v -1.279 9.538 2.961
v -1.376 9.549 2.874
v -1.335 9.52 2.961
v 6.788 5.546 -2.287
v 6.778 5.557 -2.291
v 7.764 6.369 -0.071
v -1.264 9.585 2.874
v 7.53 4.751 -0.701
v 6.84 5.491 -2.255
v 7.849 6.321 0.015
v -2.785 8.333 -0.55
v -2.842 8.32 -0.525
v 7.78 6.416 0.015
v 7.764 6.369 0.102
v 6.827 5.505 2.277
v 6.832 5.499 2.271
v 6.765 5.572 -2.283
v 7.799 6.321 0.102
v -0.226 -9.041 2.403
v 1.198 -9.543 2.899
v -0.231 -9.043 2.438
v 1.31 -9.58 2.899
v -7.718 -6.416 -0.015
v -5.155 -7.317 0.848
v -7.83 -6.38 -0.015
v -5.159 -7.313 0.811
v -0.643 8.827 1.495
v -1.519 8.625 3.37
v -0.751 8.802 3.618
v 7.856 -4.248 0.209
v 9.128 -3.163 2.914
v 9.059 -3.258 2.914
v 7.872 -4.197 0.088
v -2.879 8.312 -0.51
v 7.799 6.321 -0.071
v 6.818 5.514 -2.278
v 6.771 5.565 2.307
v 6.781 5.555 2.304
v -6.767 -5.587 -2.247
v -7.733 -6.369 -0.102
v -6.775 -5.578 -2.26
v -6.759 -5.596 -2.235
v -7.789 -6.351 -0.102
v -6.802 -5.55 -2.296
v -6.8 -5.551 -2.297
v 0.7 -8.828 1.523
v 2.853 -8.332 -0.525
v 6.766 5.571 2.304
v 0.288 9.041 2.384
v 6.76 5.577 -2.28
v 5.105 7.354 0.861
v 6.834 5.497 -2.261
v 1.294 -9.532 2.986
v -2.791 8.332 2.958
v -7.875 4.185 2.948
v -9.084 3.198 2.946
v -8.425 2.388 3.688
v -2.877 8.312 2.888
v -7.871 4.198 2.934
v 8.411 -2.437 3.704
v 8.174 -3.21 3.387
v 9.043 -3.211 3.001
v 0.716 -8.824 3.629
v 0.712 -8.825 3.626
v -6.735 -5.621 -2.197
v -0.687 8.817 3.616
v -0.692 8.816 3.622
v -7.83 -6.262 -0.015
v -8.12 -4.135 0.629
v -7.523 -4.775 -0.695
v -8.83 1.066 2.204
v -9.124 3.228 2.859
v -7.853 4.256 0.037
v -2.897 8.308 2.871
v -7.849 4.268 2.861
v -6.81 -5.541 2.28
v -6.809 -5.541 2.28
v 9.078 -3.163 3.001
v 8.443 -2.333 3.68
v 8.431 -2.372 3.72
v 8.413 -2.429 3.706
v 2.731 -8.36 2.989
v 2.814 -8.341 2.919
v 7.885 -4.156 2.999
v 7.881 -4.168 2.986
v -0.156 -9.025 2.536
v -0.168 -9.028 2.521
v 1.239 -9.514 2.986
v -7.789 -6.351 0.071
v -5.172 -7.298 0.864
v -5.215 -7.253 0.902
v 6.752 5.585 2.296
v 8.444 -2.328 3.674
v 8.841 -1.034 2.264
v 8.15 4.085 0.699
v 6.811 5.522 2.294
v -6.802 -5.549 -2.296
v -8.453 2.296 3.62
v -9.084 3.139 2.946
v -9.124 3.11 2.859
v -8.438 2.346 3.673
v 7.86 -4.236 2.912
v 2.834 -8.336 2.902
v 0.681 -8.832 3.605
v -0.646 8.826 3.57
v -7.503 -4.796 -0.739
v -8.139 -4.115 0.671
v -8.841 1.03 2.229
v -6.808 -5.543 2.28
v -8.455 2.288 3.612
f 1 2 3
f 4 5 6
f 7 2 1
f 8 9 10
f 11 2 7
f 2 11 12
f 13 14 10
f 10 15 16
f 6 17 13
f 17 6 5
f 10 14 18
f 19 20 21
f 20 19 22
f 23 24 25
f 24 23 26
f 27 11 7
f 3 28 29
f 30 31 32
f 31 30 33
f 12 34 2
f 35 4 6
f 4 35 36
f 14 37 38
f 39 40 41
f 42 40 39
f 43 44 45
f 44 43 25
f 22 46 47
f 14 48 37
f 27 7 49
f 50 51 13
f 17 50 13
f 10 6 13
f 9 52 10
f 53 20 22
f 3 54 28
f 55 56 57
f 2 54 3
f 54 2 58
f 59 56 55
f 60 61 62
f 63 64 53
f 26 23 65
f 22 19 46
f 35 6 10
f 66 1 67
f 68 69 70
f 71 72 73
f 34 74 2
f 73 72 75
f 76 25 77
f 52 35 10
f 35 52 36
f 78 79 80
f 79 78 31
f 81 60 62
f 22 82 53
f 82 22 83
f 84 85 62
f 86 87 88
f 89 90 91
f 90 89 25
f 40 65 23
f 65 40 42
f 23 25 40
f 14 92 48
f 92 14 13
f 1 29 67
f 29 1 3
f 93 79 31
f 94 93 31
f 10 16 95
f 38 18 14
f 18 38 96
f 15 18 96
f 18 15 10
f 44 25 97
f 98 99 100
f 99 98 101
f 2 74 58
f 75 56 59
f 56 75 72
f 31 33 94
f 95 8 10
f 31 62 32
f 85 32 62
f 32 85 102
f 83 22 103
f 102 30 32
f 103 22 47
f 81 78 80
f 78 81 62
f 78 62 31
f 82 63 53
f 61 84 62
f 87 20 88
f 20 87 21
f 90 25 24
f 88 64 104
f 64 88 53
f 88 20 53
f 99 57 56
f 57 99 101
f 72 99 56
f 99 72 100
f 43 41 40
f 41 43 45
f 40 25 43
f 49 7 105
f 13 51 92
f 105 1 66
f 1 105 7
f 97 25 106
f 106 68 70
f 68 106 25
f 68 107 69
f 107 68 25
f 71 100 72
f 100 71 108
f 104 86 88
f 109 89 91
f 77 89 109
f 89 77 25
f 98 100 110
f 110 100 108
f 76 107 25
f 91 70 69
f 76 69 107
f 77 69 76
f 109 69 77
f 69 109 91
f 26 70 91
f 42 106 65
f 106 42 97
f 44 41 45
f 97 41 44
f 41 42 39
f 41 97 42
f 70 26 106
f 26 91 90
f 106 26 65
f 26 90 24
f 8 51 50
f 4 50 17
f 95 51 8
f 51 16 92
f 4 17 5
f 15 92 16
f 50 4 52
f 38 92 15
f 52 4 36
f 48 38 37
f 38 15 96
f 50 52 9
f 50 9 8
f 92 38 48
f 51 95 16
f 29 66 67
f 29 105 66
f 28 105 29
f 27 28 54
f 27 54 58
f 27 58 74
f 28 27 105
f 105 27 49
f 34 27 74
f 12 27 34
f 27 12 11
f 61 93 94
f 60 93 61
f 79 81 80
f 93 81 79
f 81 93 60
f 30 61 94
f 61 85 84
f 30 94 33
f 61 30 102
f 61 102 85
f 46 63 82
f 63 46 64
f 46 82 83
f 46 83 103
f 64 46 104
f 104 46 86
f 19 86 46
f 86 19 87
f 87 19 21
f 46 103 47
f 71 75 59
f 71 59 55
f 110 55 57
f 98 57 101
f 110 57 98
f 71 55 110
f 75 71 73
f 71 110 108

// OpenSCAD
// Auto-generated OpenSCAD file

    inner_points = 10*[[-0.42241592184244553, -0.3935709876343616, 0.8164965809276301], [0.552050434404801, -0.1690374254610991, 0.8164965809279018], [-0.1296345125630803, 0.5626084130956421, 0.8164965809276461], [0.5520504344052842, -0.16903742546121997, -0.8164965809275502], [-0.29278140927936525, -0.9561794007300037, -1.5987211554602254e-14], [0.29278140927936525, 0.9561794007300037, 1.5987211554602254e-14], [-0.42241592184196236, -0.3935709876344824, -0.816496580927822], [0.6816849469678814, -0.7316458385567411, 2.5579538487363607e-13], [-0.6816849469678814, 0.7316458385567411, -2.5579538487363607e-13], [-0.12963451256259706, 0.5626084130955212, -0.816496580927806], [-0.9744663562472466, -0.22453356217326248, -2.7176669244139555e-13], [0.9744663562472466, 0.22453356217326248, 2.7176669244139555e-13]];

    outer_points = 10*[[0.1279020562557553, -0.9484628204349614, 0.2899298919706412], [0.5177054037875468, -0.6332250521206378, -0.5753322068648584], [0.9027667961251077, -0.3163375745111199, 0.2914492250228672], [-0.5145441003247264, 0.6321252459238417, -0.5793634802839585], [-0.7748647398693524, -0.6321252459238417, -0.001519333052226013], [0.7748647398693524, 0.6321252459238417, 0.001519333052226013], [-0.904347447856518, 0.316887477609518, 0.2858986185515415], [-0.38506139233756087, -0.316887477609518, -0.8667814318877258], [0.38506139233756087, 0.316887477609518, 0.8667814318877258], [-0.12948270798716557, 0.9490127235333596, 0.28741795160376743], [-0.3898033475317915, -0.31523776831432365, 0.8652620988354998], [0.3898033475317915, 0.31523776831432365, -0.8652620988354998]];

    // Convex hull for inner set (I)
    module inner_hull() {
        hull() {
            for (p = inner_points) {
                translate(p) sphere(r=0.1);
            }
        }
    }

    // Convex hull for outer set (O) minus inner hull (O \ I)
    module outer_minus_inner() {
        difference() {
            hull() {
                for (p = outer_points) {
                    translate(p) sphere(r=0.1);
                }
            }
            inner_hull(); // Subtract inner hull
        }
    }

    // Convex hull for outer set (O) minus all translated inner hulls
    module outer_minus_AllTranslationInner() {
        difference() {
            hull() {
                for (p = outer_points) {
                    translate(p) sphere(r=0.1);
                }
            }
            hull() {
                translate([0,0,50]) inner_hull();
                translate([0,0,-50]) inner_hull();
            }; // Subtract translated inner hulls
        }
    }

    // Difference between outer_minus_inner and outer_minus_AllTranslationInner
    module outer_minus_inner_diff() {
        difference() {
            // Outer minus inner
            difference() {
                hull() {
                    for (p = outer_points) {
                        translate(p) sphere(r=0.1);
                    }
                }
                inner_hull();
            }

            // Subtract Outer minus AllTranslationInner
            difference() {
                hull() {
                    for (p = outer_points) {
                        translate(p) sphere(r=0.1);
                    }
                }
                hull() {
                    translate([0,0,50]) inner_hull();
                    translate([0,0,-50]) inner_hull();
                };
            }
        }
    }

    // Rendering all with colors applied
    color([0, 1, 0, 1]) outer_minus_AllTranslationInner(); // Opaque green
    
